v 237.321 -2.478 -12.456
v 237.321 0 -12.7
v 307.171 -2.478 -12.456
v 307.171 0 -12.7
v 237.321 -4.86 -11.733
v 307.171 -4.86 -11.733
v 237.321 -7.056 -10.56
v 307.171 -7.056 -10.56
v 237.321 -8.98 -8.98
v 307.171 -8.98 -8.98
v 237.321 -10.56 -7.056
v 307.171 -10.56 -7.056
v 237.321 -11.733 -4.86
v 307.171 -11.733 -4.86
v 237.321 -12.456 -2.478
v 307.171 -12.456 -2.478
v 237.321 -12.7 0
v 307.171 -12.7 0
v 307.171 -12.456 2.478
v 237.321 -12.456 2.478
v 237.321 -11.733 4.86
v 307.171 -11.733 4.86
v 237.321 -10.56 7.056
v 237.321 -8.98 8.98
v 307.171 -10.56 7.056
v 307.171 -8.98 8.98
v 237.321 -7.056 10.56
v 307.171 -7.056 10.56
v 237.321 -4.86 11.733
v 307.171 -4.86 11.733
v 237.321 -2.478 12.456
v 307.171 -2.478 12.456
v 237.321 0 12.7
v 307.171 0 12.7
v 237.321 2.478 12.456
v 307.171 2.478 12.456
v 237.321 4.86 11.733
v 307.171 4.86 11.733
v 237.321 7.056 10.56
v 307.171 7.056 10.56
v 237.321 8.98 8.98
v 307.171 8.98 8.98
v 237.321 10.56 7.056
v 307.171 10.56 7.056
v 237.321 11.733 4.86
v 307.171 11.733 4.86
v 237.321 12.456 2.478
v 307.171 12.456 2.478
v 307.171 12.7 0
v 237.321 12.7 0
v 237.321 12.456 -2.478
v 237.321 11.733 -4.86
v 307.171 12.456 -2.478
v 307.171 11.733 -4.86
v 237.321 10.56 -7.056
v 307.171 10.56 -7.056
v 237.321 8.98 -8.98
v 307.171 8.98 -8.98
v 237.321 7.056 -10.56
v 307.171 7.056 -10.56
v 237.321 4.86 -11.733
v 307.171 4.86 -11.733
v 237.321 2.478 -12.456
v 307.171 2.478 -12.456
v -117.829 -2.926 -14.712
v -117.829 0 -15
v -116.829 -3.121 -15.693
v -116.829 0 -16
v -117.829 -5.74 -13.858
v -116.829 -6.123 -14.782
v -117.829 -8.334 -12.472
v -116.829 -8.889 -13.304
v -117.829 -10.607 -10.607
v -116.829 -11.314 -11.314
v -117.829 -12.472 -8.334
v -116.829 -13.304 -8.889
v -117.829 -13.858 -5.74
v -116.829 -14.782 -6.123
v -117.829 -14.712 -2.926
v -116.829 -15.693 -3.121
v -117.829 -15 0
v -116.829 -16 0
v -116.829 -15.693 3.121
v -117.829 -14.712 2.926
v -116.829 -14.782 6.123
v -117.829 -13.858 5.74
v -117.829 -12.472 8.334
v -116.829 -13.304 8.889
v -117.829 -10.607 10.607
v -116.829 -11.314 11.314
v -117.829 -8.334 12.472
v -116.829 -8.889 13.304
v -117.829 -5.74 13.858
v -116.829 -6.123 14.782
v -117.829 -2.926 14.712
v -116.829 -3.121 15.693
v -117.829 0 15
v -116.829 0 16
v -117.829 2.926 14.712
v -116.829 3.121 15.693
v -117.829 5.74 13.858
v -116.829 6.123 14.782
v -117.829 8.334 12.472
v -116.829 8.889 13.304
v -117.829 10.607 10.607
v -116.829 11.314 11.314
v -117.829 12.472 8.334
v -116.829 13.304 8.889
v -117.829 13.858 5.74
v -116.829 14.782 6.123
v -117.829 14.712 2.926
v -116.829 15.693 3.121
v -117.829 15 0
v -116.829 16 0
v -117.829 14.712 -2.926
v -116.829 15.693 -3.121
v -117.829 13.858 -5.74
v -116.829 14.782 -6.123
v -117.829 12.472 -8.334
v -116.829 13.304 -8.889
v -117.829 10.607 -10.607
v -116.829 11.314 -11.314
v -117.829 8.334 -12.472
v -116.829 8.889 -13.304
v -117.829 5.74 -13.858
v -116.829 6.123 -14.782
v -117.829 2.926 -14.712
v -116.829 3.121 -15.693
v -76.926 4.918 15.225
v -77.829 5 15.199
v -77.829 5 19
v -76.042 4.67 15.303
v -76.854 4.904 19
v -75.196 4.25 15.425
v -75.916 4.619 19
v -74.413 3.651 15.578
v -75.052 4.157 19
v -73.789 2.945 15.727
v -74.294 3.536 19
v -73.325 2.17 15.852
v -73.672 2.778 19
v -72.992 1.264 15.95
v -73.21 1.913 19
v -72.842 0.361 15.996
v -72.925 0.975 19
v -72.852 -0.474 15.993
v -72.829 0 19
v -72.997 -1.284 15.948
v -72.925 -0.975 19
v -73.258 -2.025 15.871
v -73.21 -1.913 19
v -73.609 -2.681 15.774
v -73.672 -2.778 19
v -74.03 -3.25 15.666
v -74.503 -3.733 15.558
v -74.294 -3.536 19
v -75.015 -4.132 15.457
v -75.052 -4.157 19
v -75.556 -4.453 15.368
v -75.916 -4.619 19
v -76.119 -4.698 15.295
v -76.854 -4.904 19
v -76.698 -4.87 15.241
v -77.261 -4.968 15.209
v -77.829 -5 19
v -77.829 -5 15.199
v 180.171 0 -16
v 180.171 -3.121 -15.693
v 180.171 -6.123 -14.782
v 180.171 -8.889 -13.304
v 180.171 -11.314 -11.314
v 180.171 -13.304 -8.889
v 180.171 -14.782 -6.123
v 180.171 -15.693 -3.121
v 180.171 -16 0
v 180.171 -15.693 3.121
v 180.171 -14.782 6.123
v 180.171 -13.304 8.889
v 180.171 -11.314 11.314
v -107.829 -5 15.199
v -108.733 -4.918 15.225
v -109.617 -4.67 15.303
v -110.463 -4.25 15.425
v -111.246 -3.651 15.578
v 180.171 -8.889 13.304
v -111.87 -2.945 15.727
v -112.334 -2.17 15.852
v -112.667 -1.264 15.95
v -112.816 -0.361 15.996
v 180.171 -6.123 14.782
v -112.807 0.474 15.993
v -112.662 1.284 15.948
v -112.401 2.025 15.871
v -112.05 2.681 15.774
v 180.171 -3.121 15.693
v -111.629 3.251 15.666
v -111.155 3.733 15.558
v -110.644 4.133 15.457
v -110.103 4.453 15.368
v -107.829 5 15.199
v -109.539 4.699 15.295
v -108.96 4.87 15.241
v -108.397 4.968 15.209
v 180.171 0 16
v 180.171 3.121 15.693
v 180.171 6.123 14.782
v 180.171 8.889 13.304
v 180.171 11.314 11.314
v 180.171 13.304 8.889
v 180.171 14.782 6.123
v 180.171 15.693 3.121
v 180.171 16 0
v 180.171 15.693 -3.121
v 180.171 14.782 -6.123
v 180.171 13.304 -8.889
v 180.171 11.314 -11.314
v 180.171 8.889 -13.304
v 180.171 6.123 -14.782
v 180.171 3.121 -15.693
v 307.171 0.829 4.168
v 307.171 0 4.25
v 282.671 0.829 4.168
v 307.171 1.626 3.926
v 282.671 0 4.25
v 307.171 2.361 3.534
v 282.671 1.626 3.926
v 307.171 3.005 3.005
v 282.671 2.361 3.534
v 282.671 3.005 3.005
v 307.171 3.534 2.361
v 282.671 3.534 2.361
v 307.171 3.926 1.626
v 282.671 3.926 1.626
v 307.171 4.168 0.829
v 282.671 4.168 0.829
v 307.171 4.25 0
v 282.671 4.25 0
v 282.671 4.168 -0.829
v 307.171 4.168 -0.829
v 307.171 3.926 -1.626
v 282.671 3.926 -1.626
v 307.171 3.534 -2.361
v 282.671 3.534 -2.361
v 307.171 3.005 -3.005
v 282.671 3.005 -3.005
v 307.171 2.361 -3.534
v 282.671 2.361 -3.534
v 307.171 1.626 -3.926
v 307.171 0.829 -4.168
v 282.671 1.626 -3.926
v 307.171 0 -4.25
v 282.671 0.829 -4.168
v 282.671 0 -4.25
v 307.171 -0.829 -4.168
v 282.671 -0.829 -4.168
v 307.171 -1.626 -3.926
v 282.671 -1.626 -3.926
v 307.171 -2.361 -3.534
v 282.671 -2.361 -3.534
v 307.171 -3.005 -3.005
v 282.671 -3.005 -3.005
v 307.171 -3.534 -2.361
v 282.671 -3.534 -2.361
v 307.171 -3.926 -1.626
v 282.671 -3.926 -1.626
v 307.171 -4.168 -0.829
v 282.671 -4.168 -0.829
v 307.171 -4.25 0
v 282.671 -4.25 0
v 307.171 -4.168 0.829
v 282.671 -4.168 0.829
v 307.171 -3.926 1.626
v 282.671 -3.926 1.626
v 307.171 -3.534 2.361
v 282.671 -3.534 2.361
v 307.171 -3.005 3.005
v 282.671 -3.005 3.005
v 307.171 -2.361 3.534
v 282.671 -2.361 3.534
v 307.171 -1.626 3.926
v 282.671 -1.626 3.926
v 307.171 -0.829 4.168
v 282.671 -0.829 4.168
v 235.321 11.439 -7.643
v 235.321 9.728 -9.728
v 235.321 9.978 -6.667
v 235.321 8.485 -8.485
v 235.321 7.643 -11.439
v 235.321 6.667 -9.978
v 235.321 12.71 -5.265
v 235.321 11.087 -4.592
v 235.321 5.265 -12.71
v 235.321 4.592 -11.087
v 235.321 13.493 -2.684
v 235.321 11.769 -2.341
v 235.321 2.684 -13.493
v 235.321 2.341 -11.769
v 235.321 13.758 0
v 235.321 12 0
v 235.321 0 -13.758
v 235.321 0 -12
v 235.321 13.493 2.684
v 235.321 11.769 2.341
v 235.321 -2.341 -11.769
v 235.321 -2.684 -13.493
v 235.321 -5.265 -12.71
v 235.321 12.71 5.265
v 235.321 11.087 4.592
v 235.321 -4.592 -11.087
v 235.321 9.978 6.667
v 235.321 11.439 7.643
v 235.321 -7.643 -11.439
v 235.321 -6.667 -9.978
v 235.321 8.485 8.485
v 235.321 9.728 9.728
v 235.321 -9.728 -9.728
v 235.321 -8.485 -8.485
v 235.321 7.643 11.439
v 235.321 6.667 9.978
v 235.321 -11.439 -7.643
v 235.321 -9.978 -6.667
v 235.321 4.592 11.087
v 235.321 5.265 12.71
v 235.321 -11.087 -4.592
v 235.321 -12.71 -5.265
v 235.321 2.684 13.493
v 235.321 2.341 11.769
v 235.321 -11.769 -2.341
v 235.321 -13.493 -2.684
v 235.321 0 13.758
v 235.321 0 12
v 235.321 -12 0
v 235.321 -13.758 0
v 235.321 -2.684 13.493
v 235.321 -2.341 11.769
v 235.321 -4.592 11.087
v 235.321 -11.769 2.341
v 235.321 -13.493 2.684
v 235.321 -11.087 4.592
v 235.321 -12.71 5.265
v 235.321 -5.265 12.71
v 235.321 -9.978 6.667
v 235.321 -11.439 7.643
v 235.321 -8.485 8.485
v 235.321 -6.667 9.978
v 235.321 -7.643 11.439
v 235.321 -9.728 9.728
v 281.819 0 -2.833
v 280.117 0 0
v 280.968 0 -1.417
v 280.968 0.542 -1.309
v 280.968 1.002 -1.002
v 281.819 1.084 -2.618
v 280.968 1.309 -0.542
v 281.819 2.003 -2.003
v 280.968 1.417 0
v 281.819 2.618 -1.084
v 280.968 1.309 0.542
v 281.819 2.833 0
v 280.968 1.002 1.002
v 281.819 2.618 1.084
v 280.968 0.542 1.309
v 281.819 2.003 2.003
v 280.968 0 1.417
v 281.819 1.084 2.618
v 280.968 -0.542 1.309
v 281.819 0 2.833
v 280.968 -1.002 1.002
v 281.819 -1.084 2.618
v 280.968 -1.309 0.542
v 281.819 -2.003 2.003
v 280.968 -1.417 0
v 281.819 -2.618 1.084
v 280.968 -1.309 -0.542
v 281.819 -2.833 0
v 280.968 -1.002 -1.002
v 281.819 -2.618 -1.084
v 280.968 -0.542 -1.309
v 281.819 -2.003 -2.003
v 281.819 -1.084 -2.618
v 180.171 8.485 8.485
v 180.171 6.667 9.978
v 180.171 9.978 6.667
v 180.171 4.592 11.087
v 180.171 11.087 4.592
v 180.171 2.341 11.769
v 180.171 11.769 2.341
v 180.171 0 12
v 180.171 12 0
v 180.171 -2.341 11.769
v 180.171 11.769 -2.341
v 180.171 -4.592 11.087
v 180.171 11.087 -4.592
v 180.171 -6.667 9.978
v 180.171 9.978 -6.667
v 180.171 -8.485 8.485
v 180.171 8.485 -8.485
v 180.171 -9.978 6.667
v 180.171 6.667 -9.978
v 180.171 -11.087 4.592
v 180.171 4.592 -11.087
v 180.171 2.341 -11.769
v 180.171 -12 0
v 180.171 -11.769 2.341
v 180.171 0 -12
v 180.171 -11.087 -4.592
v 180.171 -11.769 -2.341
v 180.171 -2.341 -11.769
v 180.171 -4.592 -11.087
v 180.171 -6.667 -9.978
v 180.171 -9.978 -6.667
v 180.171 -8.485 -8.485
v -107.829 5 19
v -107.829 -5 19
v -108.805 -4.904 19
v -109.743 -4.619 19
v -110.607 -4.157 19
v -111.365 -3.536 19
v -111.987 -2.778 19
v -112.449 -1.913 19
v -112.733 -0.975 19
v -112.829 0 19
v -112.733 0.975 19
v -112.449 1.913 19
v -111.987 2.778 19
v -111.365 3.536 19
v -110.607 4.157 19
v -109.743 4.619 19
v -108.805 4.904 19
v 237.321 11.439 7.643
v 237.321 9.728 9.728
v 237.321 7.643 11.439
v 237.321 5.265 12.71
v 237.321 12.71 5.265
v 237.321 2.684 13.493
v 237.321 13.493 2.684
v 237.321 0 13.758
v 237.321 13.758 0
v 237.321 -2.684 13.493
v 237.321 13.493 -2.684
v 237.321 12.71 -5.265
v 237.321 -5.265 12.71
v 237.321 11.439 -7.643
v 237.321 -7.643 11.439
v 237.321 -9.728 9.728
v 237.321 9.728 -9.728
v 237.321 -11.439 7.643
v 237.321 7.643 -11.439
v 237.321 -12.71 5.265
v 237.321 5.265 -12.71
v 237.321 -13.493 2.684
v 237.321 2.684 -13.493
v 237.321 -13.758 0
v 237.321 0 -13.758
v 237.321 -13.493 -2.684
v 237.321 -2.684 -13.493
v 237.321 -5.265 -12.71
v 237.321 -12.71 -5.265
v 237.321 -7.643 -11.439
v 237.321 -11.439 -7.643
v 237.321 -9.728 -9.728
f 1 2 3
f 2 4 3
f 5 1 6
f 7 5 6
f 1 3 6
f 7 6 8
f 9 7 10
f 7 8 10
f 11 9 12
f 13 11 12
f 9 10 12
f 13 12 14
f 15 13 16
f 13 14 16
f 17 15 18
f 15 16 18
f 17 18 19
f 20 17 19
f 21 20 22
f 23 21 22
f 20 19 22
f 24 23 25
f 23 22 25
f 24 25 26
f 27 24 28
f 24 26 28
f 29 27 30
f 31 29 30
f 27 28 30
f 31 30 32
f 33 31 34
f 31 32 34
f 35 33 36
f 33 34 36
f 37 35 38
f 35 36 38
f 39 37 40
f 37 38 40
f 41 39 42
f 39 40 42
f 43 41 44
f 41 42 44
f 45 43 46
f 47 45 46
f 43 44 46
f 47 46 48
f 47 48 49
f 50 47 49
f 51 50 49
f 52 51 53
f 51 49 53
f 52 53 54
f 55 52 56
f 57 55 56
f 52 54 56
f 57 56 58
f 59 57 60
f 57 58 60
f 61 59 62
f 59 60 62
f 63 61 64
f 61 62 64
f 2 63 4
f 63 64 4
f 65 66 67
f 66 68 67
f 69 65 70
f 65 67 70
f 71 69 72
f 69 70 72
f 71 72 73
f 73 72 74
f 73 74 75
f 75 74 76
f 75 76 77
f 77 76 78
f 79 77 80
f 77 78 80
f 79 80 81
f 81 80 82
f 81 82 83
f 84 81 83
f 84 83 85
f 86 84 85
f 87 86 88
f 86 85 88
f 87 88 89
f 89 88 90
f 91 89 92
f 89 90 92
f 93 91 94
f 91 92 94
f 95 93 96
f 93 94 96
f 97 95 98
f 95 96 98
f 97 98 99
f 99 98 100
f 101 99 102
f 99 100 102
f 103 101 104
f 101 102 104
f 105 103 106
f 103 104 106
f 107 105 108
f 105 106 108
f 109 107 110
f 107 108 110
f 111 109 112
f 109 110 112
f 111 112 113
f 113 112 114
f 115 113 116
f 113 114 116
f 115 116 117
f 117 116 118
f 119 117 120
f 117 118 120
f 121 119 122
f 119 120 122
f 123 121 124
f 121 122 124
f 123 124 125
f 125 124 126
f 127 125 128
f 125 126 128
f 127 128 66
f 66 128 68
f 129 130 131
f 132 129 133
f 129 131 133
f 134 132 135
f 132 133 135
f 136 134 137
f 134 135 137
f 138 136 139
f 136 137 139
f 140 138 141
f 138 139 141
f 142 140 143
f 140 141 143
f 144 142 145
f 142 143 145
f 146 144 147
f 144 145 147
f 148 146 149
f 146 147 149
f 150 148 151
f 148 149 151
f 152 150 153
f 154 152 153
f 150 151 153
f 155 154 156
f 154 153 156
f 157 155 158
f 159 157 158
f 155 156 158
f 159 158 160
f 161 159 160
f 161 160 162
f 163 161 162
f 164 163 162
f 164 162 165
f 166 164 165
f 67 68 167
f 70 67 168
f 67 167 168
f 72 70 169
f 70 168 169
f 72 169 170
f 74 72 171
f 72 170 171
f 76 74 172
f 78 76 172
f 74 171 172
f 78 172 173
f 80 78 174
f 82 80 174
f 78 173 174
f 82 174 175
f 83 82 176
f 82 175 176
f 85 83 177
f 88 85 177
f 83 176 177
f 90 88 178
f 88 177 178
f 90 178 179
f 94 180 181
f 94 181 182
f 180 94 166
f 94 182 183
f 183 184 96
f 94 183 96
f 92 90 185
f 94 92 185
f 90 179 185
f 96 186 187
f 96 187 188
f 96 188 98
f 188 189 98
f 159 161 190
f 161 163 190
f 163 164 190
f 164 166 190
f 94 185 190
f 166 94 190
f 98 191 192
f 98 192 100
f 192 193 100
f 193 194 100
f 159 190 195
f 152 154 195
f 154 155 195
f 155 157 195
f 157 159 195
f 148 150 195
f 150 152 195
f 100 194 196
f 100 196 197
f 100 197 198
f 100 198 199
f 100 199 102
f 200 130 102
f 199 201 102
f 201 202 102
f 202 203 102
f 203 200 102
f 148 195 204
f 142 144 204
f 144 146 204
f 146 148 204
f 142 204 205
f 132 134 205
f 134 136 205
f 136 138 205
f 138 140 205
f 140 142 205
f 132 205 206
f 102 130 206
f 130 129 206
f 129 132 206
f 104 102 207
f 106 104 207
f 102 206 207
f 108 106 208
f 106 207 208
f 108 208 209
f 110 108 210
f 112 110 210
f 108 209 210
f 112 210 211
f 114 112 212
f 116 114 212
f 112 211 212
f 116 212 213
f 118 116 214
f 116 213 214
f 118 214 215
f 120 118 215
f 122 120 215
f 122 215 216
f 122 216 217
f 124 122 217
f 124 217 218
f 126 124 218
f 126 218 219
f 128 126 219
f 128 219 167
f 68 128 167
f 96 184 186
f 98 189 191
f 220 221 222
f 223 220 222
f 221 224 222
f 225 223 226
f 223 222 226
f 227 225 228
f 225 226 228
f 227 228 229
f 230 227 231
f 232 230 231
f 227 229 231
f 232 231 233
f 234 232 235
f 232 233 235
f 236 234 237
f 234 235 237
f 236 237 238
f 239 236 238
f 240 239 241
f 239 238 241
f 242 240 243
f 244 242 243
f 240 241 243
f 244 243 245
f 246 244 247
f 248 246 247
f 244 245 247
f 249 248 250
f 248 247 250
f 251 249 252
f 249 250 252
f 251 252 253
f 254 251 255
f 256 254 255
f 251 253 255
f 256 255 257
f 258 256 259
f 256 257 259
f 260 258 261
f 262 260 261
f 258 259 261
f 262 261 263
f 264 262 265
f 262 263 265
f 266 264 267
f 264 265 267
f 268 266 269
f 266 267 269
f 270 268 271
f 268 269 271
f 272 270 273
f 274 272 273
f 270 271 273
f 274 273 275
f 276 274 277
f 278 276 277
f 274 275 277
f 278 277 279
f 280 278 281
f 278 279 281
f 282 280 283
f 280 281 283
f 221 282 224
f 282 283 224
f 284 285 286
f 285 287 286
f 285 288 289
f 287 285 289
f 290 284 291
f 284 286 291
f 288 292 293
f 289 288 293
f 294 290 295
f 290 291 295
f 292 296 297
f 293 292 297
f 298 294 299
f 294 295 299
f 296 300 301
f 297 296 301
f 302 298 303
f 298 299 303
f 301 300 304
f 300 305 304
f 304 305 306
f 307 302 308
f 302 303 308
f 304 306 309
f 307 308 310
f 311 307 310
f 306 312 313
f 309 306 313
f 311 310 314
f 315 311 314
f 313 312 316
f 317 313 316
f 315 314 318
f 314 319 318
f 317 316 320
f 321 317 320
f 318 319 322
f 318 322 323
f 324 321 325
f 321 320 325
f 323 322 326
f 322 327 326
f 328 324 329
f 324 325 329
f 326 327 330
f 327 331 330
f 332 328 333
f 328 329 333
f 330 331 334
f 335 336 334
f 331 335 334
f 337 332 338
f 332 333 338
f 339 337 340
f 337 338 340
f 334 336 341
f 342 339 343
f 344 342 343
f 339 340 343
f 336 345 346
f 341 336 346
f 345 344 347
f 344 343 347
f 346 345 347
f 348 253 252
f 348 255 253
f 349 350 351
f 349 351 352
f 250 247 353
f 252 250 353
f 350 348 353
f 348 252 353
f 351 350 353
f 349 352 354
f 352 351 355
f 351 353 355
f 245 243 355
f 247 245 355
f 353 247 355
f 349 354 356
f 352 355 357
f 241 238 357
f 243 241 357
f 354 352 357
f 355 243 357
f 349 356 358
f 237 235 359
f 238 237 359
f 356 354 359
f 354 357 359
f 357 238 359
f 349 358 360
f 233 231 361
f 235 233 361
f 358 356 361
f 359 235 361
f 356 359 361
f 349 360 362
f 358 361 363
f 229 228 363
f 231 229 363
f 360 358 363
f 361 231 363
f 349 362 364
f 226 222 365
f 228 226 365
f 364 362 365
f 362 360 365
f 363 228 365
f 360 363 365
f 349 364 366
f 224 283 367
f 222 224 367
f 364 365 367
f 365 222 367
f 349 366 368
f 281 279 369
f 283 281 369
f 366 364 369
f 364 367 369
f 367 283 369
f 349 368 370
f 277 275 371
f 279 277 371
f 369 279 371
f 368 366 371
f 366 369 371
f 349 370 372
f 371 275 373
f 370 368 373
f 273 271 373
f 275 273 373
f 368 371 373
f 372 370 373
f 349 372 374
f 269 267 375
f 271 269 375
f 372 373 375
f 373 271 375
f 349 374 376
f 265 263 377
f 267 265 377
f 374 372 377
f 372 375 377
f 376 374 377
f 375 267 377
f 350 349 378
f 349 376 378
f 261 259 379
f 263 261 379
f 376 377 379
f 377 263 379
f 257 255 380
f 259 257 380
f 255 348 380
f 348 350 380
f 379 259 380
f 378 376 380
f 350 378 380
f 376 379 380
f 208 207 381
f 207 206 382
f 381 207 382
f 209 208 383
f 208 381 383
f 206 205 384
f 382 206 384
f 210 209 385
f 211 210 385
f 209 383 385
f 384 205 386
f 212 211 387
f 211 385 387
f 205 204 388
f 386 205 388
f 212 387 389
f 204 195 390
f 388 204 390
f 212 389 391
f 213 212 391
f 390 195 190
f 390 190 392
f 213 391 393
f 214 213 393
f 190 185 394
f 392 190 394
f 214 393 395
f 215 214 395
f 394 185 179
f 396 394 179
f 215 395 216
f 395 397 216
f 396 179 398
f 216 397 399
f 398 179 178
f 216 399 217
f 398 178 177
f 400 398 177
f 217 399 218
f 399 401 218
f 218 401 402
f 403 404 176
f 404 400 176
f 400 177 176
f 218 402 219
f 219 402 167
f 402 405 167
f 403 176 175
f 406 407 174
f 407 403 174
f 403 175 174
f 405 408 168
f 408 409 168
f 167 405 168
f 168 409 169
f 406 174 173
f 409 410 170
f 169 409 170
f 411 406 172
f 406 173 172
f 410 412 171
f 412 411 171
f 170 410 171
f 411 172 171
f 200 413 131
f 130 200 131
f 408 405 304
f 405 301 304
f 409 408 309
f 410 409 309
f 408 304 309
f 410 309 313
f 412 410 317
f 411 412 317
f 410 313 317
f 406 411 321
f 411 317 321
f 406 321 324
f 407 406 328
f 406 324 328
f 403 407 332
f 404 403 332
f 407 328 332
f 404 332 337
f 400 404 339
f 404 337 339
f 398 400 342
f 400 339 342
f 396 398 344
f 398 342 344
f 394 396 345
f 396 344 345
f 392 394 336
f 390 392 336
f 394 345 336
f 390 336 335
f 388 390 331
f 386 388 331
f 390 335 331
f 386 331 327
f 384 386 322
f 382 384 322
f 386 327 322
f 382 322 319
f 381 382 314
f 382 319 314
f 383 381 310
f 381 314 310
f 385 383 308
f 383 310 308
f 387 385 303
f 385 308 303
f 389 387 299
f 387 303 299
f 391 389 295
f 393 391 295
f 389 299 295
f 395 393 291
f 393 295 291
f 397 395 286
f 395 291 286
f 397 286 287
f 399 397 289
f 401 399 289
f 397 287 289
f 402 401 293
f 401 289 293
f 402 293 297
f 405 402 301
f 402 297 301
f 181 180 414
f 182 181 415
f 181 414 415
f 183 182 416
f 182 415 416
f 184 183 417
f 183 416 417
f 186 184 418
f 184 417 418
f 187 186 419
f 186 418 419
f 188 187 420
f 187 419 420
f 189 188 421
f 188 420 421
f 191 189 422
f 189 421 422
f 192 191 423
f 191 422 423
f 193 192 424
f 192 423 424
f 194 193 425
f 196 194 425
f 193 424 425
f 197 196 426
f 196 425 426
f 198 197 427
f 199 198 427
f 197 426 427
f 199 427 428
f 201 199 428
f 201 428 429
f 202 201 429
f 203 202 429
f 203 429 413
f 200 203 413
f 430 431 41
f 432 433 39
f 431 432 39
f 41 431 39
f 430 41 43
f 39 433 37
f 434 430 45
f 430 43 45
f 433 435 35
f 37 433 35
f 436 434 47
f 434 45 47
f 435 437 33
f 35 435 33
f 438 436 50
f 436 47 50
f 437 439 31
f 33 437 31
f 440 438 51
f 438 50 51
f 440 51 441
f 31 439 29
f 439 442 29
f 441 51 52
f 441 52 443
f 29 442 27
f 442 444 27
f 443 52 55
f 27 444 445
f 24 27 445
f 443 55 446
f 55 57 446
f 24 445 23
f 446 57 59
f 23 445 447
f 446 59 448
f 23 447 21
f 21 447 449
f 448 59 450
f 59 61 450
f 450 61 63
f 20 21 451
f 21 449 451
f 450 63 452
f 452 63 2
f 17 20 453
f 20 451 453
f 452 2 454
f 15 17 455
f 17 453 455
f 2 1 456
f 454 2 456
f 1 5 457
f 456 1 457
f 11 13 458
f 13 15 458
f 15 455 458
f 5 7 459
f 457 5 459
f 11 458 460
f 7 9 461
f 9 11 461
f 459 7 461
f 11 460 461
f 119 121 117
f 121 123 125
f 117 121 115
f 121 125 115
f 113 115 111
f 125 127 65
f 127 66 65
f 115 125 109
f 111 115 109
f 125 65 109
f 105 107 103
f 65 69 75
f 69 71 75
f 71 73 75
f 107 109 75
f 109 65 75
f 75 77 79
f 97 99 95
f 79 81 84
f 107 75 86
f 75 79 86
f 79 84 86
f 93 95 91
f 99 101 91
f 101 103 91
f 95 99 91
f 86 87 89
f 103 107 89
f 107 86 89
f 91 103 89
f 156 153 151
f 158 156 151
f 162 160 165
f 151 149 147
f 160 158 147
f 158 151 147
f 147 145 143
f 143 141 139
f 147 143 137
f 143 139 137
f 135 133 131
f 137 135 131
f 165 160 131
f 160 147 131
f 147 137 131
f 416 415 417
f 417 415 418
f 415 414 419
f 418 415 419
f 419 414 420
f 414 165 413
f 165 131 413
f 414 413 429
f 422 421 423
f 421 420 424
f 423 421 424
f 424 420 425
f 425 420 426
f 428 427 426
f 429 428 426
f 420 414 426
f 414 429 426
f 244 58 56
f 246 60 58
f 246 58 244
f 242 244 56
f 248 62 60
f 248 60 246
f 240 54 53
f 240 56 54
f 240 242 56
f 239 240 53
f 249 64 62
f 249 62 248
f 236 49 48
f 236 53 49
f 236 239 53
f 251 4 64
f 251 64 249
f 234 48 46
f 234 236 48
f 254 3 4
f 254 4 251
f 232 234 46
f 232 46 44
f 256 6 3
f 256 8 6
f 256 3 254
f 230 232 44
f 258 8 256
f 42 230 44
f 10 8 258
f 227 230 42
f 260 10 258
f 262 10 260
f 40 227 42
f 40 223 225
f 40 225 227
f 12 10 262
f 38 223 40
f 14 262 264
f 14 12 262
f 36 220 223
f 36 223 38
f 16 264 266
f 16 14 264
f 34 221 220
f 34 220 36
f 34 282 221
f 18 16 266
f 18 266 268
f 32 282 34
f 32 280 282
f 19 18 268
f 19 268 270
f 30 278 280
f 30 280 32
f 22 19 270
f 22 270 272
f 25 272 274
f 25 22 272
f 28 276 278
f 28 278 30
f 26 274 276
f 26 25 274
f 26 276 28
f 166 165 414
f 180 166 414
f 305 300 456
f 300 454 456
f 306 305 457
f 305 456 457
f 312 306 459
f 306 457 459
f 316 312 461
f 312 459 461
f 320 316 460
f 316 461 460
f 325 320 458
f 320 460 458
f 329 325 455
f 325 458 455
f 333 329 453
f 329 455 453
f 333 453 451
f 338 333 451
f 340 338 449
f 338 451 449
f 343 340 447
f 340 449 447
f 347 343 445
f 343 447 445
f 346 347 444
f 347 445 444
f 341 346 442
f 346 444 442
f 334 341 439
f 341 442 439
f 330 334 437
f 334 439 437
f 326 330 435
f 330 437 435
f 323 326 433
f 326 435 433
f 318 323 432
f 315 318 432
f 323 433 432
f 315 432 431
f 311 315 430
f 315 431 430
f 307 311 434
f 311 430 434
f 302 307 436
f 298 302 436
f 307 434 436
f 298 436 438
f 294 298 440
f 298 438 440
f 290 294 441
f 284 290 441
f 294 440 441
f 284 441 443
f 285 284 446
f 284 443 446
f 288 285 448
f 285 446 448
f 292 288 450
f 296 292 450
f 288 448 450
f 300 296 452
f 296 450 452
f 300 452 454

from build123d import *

# Parameters (mm, degrees)
BOSS_EXTRUDE1_DEPTH        = 10
M10X1_5_TAPPED_HOLE1_D     = 8.5
M10X1_5_TAPPED_HOLE1_DEPTH = 24.5
M10X1_5_TAPPED_HOLE1_TIP   = 2.553657631


with BuildPart() as part:
    # Sketch1 → Revolve1 (revolve)
    with BuildSketch(Plane.XY, mode=Mode.PRIVATE) as revolve1_sk:
        Polygon((0, 0), (-117.829393829, 0), (-117.829393829, 15), (-116.829393829, 16), (180.170606171, 16), (180.170606171, 12), (235.320606171, 12), (235.320606171, 13.75770445), (237.320606171, 13.75770445), (237.320606171, 12.7), (307.170606171, 12.7), (307.170606171, 11), (307.170606171, 0), align=None)
    revolve(revolve1_sk.sketch.rotate(Axis((0, 0, 0), (-1, 0, 0)), 90), axis=Axis((0, 0, 0), (-1, 0, 0)))

    # Sketch2 → Boss-Extrude1 (add)
    with BuildSketch(Plane.XY.offset(19)):
        with BuildLine():
            Line((-107.829393829, 5), (-77.829393829, 5))
            ThreePointArc((-77.829393829, 5), (-72.829393829, 0), (-77.829393829, -5))
            Line((-77.829393829, -5), (-107.829393829, -5))
            ThreePointArc((-107.829393829, -5), (-112.829393829, 0), (-107.829393829, 5))
        make_face()
    extrude(amount=-BOSS_EXTRUDE1_DEPTH)

    # M10x1.5 Tapped Hole1
    with Locations(Plane(origin=(307.170606171, 0, 0), x_dir=(0, 0, -1), z_dir=(1, 0, 0))):
        with Locations((0, 0)):
            Hole(M10X1_5_TAPPED_HOLE1_D / 2, depth=M10X1_5_TAPPED_HOLE1_DEPTH)
            with Locations((0, 0, -(M10X1_5_TAPPED_HOLE1_DEPTH + M10X1_5_TAPPED_HOLE1_TIP / 2))):  # 118° drill point
                Cone(0, M10X1_5_TAPPED_HOLE1_D / 2, M10X1_5_TAPPED_HOLE1_TIP, mode=Mode.SUBTRACT)


solid = part.part
